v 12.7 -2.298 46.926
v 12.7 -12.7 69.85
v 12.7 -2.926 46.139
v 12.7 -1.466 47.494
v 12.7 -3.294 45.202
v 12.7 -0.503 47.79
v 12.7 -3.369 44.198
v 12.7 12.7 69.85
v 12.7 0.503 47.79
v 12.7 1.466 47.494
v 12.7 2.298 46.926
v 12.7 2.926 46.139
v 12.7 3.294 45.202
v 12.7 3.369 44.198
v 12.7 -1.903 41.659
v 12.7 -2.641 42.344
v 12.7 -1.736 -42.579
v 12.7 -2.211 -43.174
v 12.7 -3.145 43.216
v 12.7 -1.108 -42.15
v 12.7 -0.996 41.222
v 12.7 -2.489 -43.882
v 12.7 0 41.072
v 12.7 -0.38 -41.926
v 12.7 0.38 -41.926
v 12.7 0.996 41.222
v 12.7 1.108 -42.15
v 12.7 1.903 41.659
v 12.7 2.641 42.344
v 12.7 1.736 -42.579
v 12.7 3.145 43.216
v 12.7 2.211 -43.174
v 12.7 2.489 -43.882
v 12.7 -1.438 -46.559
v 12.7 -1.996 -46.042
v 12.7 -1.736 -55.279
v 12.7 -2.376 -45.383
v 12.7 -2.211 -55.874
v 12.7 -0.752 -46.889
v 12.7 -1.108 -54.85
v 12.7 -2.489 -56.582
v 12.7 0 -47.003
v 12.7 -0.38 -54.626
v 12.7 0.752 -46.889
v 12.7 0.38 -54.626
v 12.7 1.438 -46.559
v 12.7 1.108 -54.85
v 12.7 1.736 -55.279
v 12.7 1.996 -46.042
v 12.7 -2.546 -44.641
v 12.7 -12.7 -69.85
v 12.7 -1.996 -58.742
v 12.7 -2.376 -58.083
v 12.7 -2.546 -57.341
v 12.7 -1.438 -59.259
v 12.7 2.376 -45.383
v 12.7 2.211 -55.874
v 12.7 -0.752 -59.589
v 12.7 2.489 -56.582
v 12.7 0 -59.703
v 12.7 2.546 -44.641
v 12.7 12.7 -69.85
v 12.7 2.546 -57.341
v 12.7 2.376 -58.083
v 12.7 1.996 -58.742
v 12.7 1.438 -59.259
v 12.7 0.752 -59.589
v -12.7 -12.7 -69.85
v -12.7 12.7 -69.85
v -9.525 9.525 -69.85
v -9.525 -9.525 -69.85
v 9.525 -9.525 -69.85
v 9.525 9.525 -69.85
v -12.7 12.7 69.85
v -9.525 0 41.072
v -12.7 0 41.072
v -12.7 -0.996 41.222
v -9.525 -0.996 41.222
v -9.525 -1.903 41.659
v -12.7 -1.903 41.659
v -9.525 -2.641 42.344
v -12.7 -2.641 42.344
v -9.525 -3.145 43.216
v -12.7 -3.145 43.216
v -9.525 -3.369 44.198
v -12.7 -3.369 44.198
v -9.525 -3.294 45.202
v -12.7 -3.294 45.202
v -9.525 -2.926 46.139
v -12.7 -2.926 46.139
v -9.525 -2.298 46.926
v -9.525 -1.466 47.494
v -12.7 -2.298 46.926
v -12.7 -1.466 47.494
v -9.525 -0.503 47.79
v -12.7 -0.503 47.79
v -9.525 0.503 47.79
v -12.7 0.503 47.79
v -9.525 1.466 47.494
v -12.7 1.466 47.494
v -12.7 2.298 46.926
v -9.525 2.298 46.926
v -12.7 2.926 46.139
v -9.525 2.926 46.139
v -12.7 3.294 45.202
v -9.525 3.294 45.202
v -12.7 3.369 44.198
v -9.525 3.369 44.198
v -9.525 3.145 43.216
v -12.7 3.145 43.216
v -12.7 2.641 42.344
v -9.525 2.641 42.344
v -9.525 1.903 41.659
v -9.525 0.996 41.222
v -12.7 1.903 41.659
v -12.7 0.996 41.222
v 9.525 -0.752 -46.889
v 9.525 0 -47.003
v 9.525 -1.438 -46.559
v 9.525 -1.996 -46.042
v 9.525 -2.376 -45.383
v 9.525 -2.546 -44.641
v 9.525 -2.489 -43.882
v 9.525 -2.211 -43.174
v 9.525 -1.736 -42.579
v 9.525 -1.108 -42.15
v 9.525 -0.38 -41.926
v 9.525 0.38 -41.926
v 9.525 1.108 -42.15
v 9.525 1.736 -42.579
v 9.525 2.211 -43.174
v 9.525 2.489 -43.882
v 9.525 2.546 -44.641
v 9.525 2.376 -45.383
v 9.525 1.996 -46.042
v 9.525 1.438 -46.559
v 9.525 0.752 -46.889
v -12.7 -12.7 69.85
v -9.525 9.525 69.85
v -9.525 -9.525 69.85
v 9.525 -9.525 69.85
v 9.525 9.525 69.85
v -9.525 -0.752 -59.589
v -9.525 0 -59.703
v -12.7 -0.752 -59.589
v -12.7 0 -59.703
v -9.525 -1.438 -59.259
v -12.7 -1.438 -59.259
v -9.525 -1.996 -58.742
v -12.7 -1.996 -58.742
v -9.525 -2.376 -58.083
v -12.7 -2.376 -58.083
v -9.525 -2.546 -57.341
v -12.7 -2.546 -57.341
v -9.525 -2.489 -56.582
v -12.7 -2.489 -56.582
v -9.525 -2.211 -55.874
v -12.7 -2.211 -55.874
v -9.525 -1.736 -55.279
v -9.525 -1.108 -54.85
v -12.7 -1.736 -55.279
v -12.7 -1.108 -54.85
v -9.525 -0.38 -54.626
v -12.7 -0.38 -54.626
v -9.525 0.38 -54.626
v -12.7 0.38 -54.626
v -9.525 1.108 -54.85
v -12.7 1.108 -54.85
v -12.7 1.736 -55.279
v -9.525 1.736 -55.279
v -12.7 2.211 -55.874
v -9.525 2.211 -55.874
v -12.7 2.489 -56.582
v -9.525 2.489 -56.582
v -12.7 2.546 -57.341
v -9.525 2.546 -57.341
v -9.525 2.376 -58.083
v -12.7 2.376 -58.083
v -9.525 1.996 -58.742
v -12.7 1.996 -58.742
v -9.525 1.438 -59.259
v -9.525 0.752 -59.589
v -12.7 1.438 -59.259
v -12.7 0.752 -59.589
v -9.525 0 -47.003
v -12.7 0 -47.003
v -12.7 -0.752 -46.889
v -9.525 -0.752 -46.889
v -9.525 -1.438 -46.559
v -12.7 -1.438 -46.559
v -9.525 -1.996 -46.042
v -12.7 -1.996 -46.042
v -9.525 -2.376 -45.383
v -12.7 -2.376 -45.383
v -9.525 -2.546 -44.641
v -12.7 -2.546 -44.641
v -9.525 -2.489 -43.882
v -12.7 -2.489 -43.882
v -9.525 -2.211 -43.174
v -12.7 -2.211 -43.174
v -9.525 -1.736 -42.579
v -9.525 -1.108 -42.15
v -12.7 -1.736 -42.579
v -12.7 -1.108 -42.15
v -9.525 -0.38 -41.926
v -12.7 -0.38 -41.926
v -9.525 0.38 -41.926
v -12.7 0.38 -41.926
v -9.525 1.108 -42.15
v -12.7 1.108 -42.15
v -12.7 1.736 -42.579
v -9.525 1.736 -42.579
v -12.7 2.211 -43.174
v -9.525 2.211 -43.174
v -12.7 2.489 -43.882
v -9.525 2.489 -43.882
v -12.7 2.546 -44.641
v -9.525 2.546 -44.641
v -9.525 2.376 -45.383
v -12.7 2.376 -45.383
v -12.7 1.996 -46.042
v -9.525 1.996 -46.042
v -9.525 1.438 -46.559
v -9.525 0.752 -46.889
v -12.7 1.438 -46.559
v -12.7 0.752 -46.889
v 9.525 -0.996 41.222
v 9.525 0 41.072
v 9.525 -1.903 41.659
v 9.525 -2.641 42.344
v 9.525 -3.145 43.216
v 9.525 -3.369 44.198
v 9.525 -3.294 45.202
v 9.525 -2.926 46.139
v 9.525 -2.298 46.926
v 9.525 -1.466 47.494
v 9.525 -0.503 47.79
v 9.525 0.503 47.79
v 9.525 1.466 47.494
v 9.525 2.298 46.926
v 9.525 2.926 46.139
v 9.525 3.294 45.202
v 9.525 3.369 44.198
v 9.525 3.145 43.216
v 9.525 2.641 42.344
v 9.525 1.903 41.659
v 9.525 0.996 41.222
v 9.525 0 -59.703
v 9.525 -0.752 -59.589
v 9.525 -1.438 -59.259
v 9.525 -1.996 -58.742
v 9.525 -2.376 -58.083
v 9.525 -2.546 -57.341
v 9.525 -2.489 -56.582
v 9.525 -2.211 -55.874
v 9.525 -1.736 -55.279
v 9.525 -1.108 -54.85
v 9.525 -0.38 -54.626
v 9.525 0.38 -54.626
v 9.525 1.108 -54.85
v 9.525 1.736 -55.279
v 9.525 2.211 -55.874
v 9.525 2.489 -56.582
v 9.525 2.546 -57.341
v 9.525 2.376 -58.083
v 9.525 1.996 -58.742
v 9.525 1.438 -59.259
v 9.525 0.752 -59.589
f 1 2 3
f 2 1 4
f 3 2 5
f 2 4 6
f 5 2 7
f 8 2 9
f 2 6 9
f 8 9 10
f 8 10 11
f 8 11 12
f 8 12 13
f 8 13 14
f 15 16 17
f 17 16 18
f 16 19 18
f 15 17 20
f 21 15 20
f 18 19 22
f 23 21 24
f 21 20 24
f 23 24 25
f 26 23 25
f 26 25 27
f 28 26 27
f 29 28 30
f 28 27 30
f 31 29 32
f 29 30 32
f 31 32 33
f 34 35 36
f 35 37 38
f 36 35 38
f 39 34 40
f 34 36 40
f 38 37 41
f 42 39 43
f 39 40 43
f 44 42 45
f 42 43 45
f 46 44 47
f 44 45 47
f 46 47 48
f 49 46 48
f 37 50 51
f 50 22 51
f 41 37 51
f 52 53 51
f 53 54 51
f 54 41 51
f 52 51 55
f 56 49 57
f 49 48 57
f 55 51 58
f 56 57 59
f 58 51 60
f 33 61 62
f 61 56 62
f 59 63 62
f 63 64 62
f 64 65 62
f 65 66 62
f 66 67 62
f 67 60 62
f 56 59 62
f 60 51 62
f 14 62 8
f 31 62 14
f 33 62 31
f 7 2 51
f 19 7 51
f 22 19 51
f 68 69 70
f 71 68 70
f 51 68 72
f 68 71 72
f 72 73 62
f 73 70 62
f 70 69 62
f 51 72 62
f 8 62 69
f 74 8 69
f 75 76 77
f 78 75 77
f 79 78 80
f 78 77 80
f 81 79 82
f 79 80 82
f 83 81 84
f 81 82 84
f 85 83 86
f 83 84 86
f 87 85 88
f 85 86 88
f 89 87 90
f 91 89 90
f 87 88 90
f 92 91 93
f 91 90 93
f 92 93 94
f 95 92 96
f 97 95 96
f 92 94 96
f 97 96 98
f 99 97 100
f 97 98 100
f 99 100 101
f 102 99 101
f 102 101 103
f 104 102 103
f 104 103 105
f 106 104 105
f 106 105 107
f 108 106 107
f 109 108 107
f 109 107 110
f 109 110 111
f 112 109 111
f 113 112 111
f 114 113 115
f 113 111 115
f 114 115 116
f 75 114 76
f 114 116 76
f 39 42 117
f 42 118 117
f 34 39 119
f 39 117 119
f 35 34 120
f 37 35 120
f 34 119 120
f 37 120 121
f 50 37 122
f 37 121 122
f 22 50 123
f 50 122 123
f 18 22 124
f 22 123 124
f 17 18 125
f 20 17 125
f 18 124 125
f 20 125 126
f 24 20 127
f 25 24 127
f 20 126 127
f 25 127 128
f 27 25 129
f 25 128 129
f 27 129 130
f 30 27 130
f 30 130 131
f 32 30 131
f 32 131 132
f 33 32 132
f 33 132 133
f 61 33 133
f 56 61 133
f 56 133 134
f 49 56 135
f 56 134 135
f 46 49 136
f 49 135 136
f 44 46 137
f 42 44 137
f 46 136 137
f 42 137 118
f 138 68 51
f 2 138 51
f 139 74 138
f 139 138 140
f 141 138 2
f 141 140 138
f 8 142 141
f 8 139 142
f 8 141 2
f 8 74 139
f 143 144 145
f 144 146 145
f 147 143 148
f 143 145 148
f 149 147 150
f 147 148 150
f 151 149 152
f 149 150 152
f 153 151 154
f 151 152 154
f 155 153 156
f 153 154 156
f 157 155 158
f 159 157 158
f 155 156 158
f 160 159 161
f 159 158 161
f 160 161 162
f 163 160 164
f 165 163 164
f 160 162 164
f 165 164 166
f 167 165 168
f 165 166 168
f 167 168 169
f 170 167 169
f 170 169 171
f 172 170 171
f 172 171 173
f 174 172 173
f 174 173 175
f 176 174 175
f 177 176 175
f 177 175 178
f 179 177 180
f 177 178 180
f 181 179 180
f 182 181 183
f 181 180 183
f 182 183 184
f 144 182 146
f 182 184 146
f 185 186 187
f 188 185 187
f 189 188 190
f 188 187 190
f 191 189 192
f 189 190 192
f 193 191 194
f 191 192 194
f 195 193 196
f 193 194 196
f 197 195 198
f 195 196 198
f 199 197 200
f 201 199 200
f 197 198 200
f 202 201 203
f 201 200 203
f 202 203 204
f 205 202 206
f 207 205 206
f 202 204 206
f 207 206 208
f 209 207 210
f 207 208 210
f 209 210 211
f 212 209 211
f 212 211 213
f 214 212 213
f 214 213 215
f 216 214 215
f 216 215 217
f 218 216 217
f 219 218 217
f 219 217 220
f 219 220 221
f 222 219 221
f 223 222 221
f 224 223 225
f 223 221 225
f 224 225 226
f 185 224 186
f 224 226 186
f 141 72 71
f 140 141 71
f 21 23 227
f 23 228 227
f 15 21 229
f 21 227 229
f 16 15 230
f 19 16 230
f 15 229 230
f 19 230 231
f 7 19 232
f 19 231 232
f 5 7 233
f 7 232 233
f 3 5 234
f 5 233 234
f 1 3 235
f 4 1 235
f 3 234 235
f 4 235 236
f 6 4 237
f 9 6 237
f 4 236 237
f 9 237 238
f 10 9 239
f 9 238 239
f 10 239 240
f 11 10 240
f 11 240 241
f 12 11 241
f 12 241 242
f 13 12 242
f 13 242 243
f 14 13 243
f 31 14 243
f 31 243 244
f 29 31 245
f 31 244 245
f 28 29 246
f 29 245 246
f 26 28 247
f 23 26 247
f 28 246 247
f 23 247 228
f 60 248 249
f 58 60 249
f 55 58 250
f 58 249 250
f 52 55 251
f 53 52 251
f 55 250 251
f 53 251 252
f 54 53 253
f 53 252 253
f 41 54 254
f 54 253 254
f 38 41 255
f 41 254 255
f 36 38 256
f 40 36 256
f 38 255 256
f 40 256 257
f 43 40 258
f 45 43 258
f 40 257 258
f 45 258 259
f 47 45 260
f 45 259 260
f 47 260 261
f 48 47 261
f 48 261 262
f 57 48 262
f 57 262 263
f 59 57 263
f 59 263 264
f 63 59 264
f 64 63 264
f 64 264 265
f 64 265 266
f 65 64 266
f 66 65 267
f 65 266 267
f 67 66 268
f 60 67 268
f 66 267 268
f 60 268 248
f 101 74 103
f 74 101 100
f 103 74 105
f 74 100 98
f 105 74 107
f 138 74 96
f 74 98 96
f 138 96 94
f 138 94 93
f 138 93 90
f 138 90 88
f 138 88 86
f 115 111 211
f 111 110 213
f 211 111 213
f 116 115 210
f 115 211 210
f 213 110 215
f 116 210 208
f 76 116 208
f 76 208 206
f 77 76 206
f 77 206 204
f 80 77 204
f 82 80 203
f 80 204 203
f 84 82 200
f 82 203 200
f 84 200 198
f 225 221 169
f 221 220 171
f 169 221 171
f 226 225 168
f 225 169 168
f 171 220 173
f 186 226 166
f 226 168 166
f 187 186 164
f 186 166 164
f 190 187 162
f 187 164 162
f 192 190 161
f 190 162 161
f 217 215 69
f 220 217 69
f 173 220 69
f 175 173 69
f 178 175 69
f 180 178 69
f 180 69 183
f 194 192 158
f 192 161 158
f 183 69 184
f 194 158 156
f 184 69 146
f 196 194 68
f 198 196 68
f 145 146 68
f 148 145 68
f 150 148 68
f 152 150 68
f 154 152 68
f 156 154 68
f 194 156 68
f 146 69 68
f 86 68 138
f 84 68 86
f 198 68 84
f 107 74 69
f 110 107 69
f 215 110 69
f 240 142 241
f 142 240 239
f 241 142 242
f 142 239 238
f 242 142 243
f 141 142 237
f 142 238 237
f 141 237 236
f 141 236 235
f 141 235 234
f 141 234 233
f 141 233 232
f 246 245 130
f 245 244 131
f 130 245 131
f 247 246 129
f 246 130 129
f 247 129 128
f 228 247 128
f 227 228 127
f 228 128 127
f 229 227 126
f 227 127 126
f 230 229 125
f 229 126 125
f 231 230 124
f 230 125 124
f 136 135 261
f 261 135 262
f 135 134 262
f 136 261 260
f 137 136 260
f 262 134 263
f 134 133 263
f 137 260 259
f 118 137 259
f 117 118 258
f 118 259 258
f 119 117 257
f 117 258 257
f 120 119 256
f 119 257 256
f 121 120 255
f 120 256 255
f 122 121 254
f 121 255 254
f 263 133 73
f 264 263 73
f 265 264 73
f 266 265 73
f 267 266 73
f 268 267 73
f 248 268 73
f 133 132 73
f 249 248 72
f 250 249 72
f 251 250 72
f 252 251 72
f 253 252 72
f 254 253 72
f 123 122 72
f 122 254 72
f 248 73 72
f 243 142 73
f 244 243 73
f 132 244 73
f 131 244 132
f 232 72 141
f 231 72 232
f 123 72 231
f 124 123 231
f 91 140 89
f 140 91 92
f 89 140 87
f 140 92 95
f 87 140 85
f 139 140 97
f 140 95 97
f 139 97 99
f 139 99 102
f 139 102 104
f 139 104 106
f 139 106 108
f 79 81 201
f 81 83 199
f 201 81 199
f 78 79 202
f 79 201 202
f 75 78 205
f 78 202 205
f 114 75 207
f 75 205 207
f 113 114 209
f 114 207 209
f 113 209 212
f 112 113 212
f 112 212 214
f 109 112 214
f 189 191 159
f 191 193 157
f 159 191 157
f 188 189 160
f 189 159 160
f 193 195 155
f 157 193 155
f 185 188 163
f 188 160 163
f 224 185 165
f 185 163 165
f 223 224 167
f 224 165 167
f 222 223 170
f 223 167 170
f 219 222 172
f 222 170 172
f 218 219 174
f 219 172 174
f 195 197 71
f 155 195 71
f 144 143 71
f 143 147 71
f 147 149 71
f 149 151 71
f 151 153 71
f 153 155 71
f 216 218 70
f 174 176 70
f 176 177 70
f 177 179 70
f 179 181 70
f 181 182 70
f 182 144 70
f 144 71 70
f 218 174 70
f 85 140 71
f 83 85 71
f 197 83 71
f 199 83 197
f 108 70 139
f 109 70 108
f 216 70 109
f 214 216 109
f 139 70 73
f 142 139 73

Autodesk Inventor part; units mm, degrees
ref_plane "YZ Plane" through (0, 0, 0) normal (1, 0, 0) x (0, 1, 0)
ref_plane "XZ Plane" through (0, 0, 0) normal (0, 1, 0) x (-1, 0, 0)
ref_plane "XY Plane" through (0, 0, 0) normal (0, 0, 1) x (1, 0, 0)
sketch "Sketch1" plane through (0, 0, 0) normal (0, 0, 1) x (1, 0, 0)
  line L0 (-12.7, -12.7) -> (12.7, -12.7)
  line L1 (12.7, -12.7) -> (12.7, 12.7)
  line L2 (12.7, 12.7) -> (-12.7, 12.7)
  line L3 (-12.7, 12.7) -> (-12.7, -12.7)
  line L4 (-12.7, -12.7) -> (12.7, 12.7) construction
  line L5 (12.7, -12.7) -> (-12.7, 12.7) construction
  line L6 (-9.525, 9.525) -> (9.525, 9.525)
  line L7 (9.525, 9.525) -> (9.525, -9.525)
  line L8 (9.525, -9.525) -> (-9.525, -9.525)
  line L9 (-9.525, -9.525) -> (-9.525, 9.525)
  point P0 (0, 0)
  dimension "width" = 25.4
  dimension "height" = 25.4
  dimension "thickness" = 3.175
extrude "Extrusion1" add sketch "Sketch1" along normal mid plane 139.7
sketch "Sketch2" plane through (12.7, -12.7, 69.85) normal (1, 0, 0) x (0, 0, -1)
  line L0 (0, 0) -> (0, 25.4) construction
  point P0 (69.85, 12.7)
  point P1 (25.4, 12.7)
  dimension "d5" = 25.4
hole "Hole1" at (12.7, 0, 44.45) direction (-1, 0, 0) diameter 6.7564 end through all clearance for "Flat Head Machine Screw (82)" size "1/4" standard "Ansi Unified Screw Threads"
sketch "Sketch3" plane through (12.7, -12.7, 69.85) normal (1, 0, 0) x (0, 0, -1)
  line L0 (139.7, 25.4) -> (139.7, 0) construction
  point P0 (69.85, 12.7)
  point P1 (127, 12.7)
  point P2 (114.3, 12.7)
  point P3 (139.7, 12.7)
  dimension "d13" = 12.7
  dimension "d14" = 12.7
hole "Hole2" at (12.7, 0, -57.15) at (12.7, 0, -44.45) direction (-1, 0, 0) diameter 5.1054 end through all clearance for "Flat Head Machine Screw (82)" size "#10" standard "Ansi Unified Screw Threads"
properties part number "CHD-003" material "Aluminum 6061"
